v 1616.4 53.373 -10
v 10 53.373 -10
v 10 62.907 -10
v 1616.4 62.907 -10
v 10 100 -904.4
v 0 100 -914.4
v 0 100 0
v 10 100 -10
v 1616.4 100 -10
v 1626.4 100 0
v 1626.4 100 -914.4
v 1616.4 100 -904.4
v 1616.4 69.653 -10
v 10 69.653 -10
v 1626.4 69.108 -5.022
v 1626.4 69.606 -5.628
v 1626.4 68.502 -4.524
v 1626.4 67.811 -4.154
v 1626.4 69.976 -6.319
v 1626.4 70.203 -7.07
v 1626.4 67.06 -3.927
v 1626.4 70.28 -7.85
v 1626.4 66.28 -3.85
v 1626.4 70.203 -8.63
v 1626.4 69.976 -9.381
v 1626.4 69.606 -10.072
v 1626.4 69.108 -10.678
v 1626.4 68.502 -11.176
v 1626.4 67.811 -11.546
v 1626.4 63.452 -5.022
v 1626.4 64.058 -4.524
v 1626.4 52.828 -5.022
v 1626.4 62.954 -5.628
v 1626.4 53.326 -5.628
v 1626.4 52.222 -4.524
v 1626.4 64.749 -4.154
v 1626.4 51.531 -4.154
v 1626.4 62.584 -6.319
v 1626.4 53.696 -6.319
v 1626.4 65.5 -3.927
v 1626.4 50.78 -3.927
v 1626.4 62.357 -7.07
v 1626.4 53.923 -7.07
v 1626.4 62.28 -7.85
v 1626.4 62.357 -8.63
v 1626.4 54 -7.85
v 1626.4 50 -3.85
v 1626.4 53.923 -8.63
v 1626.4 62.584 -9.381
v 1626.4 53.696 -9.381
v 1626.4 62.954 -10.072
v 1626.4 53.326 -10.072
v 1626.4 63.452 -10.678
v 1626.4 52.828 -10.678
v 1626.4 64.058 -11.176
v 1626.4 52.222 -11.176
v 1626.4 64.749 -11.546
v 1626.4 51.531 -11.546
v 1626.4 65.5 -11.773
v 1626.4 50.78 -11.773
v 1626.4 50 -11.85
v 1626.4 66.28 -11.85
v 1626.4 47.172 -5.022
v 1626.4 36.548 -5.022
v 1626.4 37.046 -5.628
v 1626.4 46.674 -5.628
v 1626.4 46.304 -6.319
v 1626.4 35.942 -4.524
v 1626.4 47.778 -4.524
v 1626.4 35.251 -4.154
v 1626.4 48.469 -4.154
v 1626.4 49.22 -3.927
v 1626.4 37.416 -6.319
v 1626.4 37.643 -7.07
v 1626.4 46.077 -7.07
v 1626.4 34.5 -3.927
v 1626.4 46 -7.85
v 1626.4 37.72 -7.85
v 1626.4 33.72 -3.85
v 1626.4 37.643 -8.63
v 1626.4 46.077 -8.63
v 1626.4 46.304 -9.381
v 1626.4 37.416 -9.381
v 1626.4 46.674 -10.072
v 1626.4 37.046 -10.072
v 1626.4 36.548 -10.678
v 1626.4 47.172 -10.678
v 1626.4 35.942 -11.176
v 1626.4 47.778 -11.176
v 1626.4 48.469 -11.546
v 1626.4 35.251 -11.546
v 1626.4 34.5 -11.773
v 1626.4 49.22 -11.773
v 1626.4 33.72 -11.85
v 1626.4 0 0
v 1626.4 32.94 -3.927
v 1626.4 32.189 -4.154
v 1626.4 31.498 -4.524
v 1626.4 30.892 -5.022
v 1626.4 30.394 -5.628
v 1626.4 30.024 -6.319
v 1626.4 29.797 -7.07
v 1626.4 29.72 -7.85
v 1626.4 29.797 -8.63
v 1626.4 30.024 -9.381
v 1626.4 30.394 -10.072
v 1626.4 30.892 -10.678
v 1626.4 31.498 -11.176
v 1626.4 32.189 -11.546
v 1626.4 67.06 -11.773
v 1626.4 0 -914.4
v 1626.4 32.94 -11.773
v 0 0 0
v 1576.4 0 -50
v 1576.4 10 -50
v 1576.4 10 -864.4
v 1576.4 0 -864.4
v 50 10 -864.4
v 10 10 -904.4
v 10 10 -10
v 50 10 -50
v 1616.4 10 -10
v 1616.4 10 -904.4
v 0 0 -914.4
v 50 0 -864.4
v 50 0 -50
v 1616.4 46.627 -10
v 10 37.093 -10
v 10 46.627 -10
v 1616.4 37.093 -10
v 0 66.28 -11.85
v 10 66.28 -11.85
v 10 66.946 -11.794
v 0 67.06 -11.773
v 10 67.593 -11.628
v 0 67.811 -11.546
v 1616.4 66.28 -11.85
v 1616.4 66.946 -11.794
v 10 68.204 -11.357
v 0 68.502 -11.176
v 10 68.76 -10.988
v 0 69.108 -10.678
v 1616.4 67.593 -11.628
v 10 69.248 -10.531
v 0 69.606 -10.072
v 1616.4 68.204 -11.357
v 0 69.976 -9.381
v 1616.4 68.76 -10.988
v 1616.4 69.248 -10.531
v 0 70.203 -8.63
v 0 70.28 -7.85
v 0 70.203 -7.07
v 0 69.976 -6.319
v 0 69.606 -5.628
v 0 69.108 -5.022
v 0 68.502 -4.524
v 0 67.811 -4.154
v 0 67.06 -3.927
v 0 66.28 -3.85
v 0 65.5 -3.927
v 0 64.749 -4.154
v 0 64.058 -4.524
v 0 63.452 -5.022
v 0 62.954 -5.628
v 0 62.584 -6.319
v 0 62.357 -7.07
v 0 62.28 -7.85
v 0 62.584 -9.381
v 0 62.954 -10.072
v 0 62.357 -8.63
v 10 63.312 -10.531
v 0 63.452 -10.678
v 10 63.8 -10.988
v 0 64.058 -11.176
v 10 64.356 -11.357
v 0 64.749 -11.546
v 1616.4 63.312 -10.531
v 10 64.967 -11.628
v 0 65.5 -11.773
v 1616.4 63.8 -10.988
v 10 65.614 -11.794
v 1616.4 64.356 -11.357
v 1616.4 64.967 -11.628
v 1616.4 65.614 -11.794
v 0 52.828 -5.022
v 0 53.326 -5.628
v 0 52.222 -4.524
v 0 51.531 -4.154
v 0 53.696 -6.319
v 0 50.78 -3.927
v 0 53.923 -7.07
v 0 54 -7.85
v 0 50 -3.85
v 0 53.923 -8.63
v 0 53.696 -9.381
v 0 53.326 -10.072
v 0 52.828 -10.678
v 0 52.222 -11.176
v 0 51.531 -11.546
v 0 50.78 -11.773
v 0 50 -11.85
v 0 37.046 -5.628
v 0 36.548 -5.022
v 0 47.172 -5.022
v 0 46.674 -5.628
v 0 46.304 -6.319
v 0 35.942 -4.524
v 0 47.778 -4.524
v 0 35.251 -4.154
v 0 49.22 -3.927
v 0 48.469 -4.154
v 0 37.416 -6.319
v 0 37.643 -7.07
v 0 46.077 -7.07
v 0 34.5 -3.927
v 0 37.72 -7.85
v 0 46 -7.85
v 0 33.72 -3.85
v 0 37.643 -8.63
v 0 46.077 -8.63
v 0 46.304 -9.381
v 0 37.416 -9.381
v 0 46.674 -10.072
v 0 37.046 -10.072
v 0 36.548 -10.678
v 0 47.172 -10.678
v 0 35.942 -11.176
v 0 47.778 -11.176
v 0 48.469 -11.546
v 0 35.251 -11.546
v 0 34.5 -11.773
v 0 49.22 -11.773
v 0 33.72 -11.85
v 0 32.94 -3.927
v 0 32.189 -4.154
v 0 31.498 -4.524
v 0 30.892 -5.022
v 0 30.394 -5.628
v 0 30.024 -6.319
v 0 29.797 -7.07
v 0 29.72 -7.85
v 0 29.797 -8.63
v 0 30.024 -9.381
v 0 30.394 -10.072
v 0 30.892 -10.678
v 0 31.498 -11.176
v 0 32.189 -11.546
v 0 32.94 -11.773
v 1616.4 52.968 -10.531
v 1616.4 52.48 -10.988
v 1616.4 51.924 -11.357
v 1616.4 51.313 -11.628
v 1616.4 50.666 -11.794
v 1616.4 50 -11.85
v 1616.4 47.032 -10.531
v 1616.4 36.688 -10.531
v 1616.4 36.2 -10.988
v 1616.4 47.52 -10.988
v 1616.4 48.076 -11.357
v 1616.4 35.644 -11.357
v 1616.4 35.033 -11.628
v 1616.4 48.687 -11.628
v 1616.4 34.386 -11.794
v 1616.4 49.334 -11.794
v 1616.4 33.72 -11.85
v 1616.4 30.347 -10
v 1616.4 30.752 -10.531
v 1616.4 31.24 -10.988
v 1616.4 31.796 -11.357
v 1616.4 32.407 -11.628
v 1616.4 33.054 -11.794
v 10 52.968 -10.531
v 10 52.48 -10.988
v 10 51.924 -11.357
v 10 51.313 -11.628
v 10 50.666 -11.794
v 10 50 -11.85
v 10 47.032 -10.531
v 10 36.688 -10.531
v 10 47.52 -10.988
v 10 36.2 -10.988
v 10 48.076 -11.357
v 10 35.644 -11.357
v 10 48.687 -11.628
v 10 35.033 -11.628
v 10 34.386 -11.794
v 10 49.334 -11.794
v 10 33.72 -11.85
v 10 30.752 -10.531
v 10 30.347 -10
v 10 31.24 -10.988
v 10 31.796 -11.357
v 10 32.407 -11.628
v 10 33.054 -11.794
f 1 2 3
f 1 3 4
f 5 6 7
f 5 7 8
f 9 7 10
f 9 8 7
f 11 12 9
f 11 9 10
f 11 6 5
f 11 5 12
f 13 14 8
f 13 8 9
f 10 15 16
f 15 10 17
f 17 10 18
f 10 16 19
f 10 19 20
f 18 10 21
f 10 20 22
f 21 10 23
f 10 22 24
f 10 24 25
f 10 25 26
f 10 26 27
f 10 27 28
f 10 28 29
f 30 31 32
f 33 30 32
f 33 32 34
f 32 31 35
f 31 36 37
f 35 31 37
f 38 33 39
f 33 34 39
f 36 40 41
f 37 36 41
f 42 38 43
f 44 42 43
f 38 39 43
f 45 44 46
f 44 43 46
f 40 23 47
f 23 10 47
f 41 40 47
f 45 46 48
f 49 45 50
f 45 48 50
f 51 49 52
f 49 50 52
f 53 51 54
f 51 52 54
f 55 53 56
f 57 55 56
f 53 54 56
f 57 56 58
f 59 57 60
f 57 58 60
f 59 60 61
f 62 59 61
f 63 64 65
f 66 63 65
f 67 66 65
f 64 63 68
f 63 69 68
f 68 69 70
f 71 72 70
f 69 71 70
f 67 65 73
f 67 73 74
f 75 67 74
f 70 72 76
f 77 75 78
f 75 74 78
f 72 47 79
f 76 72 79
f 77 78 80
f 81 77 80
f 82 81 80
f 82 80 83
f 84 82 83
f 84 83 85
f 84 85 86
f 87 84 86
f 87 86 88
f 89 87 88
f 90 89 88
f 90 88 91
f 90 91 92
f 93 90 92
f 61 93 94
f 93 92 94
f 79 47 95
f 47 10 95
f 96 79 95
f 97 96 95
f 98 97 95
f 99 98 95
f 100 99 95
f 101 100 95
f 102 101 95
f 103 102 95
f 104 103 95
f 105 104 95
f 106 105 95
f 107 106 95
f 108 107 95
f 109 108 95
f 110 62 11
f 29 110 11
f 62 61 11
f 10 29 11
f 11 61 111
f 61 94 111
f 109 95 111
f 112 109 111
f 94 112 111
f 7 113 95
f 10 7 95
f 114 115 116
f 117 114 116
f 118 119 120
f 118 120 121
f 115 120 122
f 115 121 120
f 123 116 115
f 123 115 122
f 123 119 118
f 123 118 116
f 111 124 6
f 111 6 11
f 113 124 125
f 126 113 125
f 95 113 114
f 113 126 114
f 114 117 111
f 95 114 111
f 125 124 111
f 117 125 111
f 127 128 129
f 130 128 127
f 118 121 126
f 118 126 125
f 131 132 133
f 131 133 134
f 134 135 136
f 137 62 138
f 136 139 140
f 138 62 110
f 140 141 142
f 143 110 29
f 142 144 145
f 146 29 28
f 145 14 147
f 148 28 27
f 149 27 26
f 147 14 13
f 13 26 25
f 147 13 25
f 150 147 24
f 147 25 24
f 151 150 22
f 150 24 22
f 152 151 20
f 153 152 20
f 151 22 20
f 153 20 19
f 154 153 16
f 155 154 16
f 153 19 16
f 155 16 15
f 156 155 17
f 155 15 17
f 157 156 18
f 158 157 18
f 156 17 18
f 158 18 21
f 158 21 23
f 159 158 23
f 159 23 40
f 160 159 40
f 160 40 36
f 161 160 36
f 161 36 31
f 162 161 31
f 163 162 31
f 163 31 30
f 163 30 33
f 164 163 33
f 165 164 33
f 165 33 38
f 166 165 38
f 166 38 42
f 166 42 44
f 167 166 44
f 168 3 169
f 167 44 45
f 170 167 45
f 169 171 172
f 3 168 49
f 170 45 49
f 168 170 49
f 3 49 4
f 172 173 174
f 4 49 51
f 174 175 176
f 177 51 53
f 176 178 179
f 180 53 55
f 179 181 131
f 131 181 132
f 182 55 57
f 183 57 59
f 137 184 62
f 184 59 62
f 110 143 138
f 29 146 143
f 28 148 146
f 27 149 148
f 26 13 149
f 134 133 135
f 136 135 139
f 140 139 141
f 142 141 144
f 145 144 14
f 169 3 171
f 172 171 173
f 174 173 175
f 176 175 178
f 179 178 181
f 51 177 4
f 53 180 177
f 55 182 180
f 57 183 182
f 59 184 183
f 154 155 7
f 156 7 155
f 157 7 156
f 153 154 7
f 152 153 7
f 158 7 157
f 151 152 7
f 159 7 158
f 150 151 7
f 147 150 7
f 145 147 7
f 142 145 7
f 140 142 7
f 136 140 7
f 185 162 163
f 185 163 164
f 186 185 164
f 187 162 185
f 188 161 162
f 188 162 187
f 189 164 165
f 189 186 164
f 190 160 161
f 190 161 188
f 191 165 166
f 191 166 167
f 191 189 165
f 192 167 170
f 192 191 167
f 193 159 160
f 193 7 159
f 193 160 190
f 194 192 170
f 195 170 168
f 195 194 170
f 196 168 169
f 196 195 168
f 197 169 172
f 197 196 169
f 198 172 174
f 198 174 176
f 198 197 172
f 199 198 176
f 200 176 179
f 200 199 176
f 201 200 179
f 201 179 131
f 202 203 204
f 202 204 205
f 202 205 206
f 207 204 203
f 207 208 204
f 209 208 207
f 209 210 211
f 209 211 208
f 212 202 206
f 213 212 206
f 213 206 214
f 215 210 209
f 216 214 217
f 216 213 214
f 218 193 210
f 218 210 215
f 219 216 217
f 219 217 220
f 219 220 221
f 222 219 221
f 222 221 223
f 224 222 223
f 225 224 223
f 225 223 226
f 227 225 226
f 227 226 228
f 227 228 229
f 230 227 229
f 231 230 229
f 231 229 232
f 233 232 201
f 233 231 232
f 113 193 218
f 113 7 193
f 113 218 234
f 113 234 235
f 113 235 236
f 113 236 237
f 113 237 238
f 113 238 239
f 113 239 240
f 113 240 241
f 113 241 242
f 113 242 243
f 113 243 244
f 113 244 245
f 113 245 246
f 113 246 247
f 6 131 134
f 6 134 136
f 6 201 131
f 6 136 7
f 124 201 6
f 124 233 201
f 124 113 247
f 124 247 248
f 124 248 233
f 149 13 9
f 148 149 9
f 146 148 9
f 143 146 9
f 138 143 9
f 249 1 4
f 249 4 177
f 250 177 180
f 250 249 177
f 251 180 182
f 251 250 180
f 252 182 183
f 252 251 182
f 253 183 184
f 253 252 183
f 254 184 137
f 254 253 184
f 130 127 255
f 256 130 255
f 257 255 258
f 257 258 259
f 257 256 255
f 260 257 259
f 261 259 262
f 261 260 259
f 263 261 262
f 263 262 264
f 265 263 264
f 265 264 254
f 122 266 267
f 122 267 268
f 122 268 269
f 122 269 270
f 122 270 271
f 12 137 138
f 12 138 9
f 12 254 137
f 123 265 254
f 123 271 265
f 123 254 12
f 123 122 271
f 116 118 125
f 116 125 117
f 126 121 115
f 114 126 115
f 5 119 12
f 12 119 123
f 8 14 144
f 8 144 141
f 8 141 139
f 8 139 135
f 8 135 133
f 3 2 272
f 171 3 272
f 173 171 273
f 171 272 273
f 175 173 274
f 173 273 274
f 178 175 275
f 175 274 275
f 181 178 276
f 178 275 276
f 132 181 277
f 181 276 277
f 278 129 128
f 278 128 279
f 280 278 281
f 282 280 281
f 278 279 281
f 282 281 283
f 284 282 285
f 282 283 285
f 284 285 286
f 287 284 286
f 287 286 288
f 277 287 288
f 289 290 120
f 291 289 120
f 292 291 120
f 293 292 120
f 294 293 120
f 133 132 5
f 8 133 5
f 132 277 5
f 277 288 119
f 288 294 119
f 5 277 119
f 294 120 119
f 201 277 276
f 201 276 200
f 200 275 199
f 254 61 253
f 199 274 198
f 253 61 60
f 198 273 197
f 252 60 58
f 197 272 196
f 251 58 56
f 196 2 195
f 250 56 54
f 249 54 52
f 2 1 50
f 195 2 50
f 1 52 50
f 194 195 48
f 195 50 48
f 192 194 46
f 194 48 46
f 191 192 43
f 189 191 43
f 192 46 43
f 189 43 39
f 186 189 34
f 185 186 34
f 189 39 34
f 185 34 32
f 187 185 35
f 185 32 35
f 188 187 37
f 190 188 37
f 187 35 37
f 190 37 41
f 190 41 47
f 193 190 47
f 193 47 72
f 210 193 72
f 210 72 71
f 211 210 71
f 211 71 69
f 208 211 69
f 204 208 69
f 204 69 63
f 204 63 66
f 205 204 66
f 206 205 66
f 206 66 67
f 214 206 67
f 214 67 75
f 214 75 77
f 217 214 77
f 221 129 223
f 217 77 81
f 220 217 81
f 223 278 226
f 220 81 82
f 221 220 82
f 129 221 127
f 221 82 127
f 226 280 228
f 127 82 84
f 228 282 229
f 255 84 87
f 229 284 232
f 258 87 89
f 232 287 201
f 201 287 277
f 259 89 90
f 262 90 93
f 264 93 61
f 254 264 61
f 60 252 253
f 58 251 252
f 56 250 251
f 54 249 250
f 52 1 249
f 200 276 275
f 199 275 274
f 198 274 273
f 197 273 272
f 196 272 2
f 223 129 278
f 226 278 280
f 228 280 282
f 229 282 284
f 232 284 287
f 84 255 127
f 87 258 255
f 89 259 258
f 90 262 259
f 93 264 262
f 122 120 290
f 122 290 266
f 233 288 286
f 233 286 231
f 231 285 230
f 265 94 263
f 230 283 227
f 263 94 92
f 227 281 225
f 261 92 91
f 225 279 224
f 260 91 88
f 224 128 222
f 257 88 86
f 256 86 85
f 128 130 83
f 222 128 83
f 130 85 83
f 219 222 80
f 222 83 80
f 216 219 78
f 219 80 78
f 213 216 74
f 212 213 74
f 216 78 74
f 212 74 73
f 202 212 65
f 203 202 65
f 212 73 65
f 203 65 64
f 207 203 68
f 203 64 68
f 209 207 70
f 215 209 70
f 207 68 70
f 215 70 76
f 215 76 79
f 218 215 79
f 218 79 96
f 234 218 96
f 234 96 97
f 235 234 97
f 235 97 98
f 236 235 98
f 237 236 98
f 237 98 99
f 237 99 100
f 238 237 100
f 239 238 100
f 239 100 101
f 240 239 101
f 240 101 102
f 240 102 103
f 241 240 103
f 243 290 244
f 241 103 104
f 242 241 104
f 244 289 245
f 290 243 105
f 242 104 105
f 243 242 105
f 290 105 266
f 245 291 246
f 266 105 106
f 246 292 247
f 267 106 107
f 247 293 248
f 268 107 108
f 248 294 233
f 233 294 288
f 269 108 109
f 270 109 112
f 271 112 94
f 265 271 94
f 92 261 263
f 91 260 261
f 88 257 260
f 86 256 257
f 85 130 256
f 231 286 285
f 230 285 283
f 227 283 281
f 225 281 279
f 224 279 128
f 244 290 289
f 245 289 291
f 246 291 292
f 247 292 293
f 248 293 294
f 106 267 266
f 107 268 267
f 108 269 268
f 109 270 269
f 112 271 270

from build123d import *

# Parameters (mm, degrees)
SKETCH2_W           = 1626.4
SKETCH2_H           = 914.4
BOSS_EXTRUDE1_DEPTH = 100
SHELL1_T            = -10
SKETCH3_W           = 1526.4
SKETCH3_H           = 814.4
CUT_EXTRUDE1_DEPTH  = 1868.994732327
SKETCH5_R           = 4
CUT_EXTRUDE2_DEPTH  = 1869.503229861
SKETCH6_R           = 4
CUT_EXTRUDE3_DEPTH  = 1869.503229861
SKETCH7_R           = 4
CUT_EXTRUDE4_DEPTH  = 1869.503229861


with BuildPart() as part:
    # Sketch2 → Boss-Extrude1 (new body)
    with BuildSketch(Plane(origin=(0, 0, 0), x_dir=(1, 0, 0), z_dir=(0, 1, 0))):
        with Locations((813.2, 457.2)):
            Rectangle(SKETCH2_W, SKETCH2_H)
    extrude(amount=BOSS_EXTRUDE1_DEPTH)

    # Shell1
    shell1_openings = [part.faces().sort_by_distance(p)[0] for p in [
        (813.2, 100, -457.2),
    ]]
    offset(amount=SHELL1_T, openings=shell1_openings, kind=Kind.INTERSECTION)

    # Sketch3 → Cut-Extrude1 (cut, through all)
    with BuildSketch(Plane(origin=(0, 10, 0), x_dir=(1, 0, 0), z_dir=(0, 1, 0))):
        with Locations((813.2, 457.2)):
            Rectangle(SKETCH3_W, SKETCH3_H)
    extrude(amount=-CUT_EXTRUDE1_DEPTH, mode=Mode.SUBTRACT)

    # Sketch5 → Cut-Extrude2 (cut, through all)
    with BuildSketch(Plane(origin=(1626.4, 0, 0), x_dir=(0, 0, -1), z_dir=(1, 0, 0))):
        with Locations((7.85, 50)):
            Circle(SKETCH5_R)
    extrude(amount=-CUT_EXTRUDE2_DEPTH, mode=Mode.SUBTRACT)

    # Sketch6 → Cut-Extrude3 (cut, through all)
    with BuildSketch(Plane(origin=(1626.4, 0, 0), x_dir=(0, 0, -1), z_dir=(1, 0, 0))):
        with Locations((7.85, 66.28)):
            Circle(SKETCH6_R)
    extrude(amount=-CUT_EXTRUDE3_DEPTH, mode=Mode.SUBTRACT)

    # Sketch7 → Cut-Extrude4 (cut, through all)
    with BuildSketch(Plane(origin=(1626.4, 0, 0), x_dir=(0, 0, -1), z_dir=(1, 0, 0))):
        with Locations((7.85, 33.72)):
            Circle(SKETCH7_R)
    extrude(amount=-CUT_EXTRUDE4_DEPTH, mode=Mode.SUBTRACT)


solid = part.part
